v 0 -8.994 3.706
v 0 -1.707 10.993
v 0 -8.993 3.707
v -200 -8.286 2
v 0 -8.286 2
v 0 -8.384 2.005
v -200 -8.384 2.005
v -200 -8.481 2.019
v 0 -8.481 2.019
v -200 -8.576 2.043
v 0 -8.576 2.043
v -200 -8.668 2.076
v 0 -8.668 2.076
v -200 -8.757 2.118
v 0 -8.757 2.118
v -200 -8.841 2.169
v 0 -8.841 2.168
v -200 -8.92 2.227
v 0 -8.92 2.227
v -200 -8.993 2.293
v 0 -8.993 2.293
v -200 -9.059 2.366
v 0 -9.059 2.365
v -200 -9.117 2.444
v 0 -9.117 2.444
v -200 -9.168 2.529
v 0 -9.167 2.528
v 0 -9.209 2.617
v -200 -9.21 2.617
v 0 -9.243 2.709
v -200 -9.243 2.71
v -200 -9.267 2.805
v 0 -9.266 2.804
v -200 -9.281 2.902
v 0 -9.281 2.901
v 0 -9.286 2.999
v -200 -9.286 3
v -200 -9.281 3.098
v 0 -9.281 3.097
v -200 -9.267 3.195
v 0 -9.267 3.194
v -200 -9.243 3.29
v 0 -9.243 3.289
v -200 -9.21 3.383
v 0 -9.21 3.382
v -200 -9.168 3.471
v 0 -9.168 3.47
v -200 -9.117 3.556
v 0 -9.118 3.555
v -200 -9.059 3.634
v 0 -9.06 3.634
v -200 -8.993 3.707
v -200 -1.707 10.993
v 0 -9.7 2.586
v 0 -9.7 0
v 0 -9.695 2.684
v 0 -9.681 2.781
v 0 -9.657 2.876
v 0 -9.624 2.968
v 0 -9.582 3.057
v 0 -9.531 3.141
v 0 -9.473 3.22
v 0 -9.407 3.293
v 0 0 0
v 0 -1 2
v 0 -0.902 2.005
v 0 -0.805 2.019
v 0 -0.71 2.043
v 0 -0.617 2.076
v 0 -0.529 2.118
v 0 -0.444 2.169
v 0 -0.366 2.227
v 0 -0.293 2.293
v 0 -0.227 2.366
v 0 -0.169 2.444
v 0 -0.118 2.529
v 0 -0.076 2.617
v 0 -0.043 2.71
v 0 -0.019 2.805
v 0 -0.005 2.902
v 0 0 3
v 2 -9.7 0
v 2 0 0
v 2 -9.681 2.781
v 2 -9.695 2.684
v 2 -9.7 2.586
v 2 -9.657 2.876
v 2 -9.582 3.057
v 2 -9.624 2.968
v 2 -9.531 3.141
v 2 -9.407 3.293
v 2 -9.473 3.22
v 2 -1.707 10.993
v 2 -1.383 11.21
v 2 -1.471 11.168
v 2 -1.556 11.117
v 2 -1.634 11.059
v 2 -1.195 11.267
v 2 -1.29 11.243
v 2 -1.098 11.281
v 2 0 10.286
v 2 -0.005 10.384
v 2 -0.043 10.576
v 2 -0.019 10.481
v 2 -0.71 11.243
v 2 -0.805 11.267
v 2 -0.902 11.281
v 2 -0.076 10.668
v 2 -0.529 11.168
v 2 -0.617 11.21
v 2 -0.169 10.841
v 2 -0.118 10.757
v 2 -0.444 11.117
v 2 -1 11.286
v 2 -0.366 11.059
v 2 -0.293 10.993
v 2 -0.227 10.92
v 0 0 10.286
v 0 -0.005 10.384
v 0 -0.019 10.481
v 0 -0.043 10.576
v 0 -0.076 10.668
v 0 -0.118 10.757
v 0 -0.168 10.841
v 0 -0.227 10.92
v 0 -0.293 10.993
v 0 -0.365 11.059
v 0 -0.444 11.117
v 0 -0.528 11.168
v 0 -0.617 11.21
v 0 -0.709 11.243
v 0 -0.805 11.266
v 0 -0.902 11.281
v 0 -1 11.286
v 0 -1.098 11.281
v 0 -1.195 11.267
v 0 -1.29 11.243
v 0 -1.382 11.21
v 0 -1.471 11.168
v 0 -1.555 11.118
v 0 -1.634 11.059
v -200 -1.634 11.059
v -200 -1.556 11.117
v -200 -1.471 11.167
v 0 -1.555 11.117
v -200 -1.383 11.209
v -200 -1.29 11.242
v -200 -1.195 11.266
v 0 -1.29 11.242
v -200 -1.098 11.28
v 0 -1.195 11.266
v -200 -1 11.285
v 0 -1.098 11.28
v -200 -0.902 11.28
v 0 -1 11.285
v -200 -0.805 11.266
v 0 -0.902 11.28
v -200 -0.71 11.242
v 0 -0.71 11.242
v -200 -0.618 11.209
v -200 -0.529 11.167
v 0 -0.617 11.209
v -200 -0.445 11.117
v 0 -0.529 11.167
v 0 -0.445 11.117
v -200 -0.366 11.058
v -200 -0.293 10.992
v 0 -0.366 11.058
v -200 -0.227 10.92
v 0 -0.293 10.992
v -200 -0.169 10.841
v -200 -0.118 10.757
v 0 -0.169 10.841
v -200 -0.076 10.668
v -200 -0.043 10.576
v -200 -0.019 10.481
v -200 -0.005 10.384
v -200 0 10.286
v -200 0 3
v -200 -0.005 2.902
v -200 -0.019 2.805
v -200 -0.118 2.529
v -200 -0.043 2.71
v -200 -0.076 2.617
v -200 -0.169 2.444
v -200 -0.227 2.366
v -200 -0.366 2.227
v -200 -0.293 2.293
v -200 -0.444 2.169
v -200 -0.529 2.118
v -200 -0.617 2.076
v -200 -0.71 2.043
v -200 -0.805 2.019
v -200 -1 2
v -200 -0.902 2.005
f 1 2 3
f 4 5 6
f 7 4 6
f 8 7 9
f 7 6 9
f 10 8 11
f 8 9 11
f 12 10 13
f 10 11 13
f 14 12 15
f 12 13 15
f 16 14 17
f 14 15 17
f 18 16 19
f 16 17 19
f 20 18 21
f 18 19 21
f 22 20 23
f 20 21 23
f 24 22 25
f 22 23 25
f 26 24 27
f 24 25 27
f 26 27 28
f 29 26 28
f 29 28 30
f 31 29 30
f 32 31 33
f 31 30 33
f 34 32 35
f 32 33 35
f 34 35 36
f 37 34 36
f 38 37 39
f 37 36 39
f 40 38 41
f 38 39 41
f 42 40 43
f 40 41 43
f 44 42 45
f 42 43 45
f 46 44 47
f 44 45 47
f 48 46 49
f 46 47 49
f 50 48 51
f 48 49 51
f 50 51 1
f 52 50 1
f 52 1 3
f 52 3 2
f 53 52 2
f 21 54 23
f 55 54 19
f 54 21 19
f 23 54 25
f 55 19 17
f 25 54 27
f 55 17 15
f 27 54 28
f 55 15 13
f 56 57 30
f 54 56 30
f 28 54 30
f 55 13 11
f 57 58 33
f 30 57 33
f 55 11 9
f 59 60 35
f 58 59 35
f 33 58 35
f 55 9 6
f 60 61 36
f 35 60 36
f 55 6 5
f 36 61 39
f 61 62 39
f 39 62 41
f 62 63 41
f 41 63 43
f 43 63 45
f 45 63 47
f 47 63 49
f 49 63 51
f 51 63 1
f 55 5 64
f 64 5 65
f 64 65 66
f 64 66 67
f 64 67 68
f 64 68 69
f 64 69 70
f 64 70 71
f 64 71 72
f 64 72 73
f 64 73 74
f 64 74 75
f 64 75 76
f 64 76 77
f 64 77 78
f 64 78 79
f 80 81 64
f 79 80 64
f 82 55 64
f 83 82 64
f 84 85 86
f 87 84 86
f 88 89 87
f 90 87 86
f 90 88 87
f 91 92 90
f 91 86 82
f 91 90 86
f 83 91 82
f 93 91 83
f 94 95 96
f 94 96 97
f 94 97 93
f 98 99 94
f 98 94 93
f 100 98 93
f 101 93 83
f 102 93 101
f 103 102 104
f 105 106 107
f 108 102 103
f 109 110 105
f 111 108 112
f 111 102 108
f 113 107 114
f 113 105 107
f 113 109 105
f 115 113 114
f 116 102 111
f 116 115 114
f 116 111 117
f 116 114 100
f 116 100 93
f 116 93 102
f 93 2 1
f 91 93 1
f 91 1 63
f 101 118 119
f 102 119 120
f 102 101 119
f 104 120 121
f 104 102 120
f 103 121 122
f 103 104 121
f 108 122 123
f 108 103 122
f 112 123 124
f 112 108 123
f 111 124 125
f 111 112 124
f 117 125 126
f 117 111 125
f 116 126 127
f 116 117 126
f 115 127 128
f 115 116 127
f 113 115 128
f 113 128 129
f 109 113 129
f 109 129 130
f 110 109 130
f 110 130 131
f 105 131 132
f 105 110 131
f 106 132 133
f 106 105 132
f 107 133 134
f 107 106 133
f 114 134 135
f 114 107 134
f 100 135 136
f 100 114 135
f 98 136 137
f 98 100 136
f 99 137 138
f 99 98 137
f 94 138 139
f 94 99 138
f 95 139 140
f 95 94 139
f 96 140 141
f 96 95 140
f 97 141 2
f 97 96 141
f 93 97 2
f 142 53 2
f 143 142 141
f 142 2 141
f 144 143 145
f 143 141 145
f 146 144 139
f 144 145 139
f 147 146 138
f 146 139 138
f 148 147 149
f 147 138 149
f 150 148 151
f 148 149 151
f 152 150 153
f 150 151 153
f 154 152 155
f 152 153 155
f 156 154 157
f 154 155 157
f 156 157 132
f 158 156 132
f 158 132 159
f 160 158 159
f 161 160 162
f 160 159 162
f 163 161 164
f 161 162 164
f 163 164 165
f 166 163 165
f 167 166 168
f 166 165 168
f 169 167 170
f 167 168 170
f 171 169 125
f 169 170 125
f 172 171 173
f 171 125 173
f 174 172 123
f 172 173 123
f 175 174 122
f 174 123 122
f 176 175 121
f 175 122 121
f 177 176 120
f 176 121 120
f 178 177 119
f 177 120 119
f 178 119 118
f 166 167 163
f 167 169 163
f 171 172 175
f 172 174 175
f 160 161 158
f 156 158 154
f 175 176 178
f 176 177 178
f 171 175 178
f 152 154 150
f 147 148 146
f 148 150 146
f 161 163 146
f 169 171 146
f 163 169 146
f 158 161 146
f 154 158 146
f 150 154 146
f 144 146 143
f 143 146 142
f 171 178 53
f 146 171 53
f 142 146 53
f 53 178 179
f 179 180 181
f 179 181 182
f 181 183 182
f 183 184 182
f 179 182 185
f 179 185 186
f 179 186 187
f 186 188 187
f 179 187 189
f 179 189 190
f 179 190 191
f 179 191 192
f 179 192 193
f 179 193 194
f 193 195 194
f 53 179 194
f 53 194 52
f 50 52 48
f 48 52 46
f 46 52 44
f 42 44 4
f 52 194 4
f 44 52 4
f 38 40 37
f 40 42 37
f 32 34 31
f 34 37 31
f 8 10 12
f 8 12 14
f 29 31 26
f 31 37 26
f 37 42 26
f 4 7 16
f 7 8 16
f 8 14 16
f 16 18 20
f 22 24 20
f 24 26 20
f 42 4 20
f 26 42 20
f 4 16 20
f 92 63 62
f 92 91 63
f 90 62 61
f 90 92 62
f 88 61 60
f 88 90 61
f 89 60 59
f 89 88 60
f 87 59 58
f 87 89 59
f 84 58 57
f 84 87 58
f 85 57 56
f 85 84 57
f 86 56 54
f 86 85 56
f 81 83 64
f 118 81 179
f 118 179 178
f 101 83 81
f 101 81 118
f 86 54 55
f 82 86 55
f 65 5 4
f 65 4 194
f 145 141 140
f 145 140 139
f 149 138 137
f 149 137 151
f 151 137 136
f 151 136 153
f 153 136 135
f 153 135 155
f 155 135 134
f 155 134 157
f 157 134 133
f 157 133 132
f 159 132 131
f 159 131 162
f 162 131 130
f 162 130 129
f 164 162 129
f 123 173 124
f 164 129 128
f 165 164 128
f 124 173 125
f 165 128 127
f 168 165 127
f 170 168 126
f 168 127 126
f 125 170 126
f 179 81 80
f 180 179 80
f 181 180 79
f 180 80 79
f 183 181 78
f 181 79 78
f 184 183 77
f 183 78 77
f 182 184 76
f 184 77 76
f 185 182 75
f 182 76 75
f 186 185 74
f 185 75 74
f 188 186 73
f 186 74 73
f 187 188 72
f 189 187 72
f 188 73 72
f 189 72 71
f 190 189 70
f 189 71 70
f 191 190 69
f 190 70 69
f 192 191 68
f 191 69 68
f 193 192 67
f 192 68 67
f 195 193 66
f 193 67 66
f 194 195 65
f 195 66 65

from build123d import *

# Parameters (mm, degrees)
PAD_DEPTH    = 2
FILLET_R     = 1
FILLET001_R  = 1
PAD001_DEPTH = 200


with BuildPart() as part:
    # Sketch → Pad (new body)
    with BuildSketch(Plane.YZ):
        Polygon((-9.7, 0), (0, 0), (0, 12.7), (-9.7, 3), align=None)
    extrude(amount=PAD_DEPTH)

    # Fillet
    fillet_edges = [part.edges().sort_by_distance(p)[0] for p in [
        (1, 0, 12.7),
    ]]
    fillet(fillet_edges, radius=FILLET_R)

    # Fillet001
    fillet001_edges = [part.edges().sort_by_distance(p)[0] for p in [
        (1, -9.7, 3),
    ]]
    fillet(fillet001_edges, radius=FILLET001_R)

    # Sketch001 (on Face1 of Fillet001) → Pad001 (join)
    with BuildSketch(Plane(origin=(0, 0, 0), x_dir=(0, 1, 0), z_dir=(-1, 0, 0))):
        with BuildLine():
            Line((0, -3), (0, -10.285787))
            ThreePointArc((-1.707108, -10.992893), (-0.617572, -11.20905), (0, -10.285787))
            Line((-8.992894, -3.707107), (-1.707108, -10.992893))
            ThreePointArc((-8.285787, -2), (-9.209667, -2.617317), (-8.992894, -3.707107))
            Line((-8.285787, -2), (-1, -2))
            ThreePointArc((0, -3), (-0.292893, -2.292893), (-1, -2))
        make_face()
    extrude(amount=PAD001_DEPTH)


solid = part.part
